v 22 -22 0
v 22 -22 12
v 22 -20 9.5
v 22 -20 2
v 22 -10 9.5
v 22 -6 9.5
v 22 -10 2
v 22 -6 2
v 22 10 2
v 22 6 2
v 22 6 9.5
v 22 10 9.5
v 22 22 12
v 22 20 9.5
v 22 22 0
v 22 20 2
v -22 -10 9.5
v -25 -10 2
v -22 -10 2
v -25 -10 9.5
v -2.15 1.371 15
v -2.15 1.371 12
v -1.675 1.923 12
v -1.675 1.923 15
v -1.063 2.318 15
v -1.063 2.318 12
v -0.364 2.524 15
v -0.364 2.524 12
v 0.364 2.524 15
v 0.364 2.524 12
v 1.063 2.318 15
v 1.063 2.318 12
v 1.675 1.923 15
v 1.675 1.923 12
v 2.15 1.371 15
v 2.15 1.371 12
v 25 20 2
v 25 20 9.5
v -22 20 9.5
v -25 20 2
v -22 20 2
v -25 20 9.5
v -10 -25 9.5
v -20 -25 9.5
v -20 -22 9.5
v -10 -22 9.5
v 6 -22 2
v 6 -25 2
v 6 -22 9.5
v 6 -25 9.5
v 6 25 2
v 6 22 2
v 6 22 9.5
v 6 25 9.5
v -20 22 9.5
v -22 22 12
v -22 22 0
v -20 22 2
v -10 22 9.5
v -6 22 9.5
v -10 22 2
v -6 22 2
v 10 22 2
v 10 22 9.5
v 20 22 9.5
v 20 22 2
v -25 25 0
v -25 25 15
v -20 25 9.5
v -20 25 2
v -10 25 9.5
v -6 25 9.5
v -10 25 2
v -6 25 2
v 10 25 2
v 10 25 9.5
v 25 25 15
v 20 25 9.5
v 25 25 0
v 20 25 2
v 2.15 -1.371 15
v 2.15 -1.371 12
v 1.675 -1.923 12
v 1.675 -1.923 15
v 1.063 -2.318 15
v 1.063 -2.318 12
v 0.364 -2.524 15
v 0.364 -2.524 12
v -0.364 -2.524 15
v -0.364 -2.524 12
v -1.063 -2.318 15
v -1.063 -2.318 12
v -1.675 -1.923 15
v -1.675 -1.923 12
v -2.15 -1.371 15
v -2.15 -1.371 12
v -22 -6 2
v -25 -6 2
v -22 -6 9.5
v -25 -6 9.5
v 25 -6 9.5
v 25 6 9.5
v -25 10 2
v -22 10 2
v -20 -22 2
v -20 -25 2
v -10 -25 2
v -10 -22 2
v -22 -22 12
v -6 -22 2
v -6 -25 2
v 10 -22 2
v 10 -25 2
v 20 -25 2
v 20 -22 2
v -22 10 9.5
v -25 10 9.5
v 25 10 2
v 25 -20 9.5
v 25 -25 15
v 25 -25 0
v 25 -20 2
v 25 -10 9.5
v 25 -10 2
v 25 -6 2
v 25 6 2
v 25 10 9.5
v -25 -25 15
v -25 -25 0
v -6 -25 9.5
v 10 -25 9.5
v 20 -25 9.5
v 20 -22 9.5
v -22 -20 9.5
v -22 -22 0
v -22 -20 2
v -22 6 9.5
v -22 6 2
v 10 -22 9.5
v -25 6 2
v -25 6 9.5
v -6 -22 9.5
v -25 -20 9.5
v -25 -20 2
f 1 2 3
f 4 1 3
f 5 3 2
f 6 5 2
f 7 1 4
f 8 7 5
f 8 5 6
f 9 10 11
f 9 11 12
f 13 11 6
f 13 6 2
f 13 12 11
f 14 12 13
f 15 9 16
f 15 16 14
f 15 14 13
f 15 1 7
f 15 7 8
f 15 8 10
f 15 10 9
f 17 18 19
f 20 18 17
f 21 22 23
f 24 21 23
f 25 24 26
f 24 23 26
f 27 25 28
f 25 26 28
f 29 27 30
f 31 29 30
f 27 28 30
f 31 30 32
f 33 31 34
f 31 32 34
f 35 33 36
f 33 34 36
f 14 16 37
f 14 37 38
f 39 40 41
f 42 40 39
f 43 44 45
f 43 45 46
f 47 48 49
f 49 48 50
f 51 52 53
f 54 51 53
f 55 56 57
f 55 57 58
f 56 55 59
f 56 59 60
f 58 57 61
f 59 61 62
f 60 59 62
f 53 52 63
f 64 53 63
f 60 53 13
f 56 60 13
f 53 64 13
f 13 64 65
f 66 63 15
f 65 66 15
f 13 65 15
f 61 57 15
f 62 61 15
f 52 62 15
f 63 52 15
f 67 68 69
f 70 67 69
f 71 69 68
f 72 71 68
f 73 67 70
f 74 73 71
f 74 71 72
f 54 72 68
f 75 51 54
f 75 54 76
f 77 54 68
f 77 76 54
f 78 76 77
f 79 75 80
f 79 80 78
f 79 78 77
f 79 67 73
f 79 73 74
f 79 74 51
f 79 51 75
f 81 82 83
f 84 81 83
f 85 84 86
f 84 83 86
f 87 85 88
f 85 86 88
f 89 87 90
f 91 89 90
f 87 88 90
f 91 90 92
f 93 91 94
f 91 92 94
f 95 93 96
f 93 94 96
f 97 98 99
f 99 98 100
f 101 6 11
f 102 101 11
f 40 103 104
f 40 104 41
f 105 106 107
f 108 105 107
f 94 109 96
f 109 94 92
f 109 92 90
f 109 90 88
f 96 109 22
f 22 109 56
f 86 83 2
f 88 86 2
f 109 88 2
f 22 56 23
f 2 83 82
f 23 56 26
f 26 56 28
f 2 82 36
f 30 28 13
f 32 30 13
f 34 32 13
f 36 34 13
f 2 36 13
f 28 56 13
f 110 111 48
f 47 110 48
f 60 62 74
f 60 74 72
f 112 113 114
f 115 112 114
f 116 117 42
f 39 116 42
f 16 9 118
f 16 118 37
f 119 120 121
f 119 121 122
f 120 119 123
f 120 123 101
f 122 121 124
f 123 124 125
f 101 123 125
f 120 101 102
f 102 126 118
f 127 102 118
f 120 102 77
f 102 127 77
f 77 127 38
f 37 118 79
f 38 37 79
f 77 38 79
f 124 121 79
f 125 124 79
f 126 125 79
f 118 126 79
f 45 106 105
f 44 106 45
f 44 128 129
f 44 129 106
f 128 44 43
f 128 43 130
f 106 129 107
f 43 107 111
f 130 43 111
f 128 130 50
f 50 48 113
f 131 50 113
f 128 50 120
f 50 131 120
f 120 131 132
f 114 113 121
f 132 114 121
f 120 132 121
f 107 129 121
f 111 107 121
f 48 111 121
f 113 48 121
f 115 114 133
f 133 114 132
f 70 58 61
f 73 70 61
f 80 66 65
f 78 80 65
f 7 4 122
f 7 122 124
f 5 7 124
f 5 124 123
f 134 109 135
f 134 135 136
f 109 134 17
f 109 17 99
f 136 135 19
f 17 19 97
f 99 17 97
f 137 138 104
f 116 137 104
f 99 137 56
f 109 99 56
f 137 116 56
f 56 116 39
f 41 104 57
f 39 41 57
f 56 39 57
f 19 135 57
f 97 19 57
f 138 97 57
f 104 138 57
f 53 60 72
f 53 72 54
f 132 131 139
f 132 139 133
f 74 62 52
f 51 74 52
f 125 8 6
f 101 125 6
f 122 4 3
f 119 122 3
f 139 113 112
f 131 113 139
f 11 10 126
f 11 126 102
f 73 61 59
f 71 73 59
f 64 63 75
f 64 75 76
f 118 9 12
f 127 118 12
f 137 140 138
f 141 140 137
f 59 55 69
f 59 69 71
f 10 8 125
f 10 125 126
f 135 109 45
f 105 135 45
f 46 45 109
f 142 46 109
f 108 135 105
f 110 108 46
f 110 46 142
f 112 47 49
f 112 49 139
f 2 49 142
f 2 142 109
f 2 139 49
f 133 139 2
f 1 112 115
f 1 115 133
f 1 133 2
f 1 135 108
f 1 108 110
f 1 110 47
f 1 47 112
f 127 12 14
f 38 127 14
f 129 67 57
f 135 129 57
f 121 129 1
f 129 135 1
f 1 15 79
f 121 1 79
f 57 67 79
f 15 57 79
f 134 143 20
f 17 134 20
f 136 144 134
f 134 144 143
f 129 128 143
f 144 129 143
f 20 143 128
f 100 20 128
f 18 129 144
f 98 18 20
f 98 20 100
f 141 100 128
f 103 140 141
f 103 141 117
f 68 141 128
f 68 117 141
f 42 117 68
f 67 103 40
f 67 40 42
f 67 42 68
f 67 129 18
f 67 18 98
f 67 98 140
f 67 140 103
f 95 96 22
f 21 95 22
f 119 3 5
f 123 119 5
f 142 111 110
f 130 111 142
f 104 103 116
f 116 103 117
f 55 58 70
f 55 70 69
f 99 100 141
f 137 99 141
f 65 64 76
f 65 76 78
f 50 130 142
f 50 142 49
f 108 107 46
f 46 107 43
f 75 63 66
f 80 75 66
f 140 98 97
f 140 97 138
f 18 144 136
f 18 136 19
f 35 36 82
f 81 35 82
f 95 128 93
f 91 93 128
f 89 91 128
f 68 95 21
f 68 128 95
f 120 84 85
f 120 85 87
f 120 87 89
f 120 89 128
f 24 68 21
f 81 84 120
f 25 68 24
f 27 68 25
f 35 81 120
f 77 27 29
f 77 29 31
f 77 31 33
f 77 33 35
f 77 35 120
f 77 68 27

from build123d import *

# Parameters (mm, degrees)
SKETCH1_W               = 50
SKETCH1_H               = 50
BOSS_EXTRUDE1_DEPTH     = 15
SHELL1_T                = -3
CUT_EXTRUDE1_DEPTH      = 1
CUT_EXTRUDE1_DEPTH_BACK = 16
SKETCH5_W               = 7.5
SKETCH5_H               = 10
SKETCH5_H_2             = 12
CUT_EXTRUDE2_DEPTH      = 1
CUT_EXTRUDE2_DEPTH_BACK = 51
SKETCH6_W               = 12
SKETCH6_H               = 7.5
SKETCH6_W_2             = 10
CUT_EXTRUDE3_DEPTH      = 1
CUT_EXTRUDE3_DEPTH_BACK = 51


with BuildPart() as part:
    # Sketch1 → Boss-Extrude1 (new body)
    with BuildSketch(Plane.XY):
        Rectangle(SKETCH1_W, SKETCH1_H)
    extrude(amount=BOSS_EXTRUDE1_DEPTH)

    # Shell1
    shell1_openings = [part.faces().sort_by_distance(p)[0] for p in [
        (0, 0, 0),
    ]]
    offset(amount=SHELL1_T, openings=shell1_openings, kind=Kind.INTERSECTION)

    # Sketch2 → Cut-Extrude1 (cut, two sides)
    with BuildSketch(Plane(origin=(0, 0, 0), x_dir=(-1, 0, 0), z_dir=(0, 0, -1))) as cut_extrude1_sk:
        with BuildLine():
            Line((-2.15, 1.37113092), (-2.15, -1.37113092))
            ThreePointArc((-2.15, -1.37113092), (0, -2.55), (2.15, -1.37113092))
            Line((2.15, -1.37113092), (2.15, 1.37113092))
            ThreePointArc((2.15, 1.37113092), (0, 2.55), (-2.15, 1.37113092))
        make_face()
    extrude(amount=CUT_EXTRUDE1_DEPTH, mode=Mode.SUBTRACT)
    extrude(cut_extrude1_sk.sketch, amount=-CUT_EXTRUDE1_DEPTH_BACK, mode=Mode.SUBTRACT)

    # Sketch5 → Cut-Extrude2 (cut, two sides)
    with BuildSketch(Plane.ZY.offset(25)) as cut_extrude2_sk:
        with Locations((5.75, 15)):
            Rectangle(SKETCH5_W, SKETCH5_H)
        with Locations((5.75, 0)):
            Rectangle(SKETCH5_W, SKETCH5_H_2)
        with Locations((5.75, -15)):
            Rectangle(SKETCH5_W, SKETCH5_H)
    extrude(amount=CUT_EXTRUDE2_DEPTH, mode=Mode.SUBTRACT)
    extrude(cut_extrude2_sk.sketch, amount=-CUT_EXTRUDE2_DEPTH_BACK, mode=Mode.SUBTRACT)

    # Sketch6 → Cut-Extrude3 (cut, two sides)
    with BuildSketch(Plane.XZ.offset(25)) as cut_extrude3_sk:
        with Locations((0, 5.75)):
            Rectangle(SKETCH6_W, SKETCH6_H)
        with Locations((15, 5.75)):
            Rectangle(SKETCH6_W_2, SKETCH6_H)
        with Locations((-15, 5.75)):
            Rectangle(SKETCH6_W_2, SKETCH6_H)
    extrude(amount=CUT_EXTRUDE3_DEPTH, mode=Mode.SUBTRACT)
    extrude(cut_extrude3_sk.sketch, amount=-CUT_EXTRUDE3_DEPTH_BACK, mode=Mode.SUBTRACT)


solid = part.part
